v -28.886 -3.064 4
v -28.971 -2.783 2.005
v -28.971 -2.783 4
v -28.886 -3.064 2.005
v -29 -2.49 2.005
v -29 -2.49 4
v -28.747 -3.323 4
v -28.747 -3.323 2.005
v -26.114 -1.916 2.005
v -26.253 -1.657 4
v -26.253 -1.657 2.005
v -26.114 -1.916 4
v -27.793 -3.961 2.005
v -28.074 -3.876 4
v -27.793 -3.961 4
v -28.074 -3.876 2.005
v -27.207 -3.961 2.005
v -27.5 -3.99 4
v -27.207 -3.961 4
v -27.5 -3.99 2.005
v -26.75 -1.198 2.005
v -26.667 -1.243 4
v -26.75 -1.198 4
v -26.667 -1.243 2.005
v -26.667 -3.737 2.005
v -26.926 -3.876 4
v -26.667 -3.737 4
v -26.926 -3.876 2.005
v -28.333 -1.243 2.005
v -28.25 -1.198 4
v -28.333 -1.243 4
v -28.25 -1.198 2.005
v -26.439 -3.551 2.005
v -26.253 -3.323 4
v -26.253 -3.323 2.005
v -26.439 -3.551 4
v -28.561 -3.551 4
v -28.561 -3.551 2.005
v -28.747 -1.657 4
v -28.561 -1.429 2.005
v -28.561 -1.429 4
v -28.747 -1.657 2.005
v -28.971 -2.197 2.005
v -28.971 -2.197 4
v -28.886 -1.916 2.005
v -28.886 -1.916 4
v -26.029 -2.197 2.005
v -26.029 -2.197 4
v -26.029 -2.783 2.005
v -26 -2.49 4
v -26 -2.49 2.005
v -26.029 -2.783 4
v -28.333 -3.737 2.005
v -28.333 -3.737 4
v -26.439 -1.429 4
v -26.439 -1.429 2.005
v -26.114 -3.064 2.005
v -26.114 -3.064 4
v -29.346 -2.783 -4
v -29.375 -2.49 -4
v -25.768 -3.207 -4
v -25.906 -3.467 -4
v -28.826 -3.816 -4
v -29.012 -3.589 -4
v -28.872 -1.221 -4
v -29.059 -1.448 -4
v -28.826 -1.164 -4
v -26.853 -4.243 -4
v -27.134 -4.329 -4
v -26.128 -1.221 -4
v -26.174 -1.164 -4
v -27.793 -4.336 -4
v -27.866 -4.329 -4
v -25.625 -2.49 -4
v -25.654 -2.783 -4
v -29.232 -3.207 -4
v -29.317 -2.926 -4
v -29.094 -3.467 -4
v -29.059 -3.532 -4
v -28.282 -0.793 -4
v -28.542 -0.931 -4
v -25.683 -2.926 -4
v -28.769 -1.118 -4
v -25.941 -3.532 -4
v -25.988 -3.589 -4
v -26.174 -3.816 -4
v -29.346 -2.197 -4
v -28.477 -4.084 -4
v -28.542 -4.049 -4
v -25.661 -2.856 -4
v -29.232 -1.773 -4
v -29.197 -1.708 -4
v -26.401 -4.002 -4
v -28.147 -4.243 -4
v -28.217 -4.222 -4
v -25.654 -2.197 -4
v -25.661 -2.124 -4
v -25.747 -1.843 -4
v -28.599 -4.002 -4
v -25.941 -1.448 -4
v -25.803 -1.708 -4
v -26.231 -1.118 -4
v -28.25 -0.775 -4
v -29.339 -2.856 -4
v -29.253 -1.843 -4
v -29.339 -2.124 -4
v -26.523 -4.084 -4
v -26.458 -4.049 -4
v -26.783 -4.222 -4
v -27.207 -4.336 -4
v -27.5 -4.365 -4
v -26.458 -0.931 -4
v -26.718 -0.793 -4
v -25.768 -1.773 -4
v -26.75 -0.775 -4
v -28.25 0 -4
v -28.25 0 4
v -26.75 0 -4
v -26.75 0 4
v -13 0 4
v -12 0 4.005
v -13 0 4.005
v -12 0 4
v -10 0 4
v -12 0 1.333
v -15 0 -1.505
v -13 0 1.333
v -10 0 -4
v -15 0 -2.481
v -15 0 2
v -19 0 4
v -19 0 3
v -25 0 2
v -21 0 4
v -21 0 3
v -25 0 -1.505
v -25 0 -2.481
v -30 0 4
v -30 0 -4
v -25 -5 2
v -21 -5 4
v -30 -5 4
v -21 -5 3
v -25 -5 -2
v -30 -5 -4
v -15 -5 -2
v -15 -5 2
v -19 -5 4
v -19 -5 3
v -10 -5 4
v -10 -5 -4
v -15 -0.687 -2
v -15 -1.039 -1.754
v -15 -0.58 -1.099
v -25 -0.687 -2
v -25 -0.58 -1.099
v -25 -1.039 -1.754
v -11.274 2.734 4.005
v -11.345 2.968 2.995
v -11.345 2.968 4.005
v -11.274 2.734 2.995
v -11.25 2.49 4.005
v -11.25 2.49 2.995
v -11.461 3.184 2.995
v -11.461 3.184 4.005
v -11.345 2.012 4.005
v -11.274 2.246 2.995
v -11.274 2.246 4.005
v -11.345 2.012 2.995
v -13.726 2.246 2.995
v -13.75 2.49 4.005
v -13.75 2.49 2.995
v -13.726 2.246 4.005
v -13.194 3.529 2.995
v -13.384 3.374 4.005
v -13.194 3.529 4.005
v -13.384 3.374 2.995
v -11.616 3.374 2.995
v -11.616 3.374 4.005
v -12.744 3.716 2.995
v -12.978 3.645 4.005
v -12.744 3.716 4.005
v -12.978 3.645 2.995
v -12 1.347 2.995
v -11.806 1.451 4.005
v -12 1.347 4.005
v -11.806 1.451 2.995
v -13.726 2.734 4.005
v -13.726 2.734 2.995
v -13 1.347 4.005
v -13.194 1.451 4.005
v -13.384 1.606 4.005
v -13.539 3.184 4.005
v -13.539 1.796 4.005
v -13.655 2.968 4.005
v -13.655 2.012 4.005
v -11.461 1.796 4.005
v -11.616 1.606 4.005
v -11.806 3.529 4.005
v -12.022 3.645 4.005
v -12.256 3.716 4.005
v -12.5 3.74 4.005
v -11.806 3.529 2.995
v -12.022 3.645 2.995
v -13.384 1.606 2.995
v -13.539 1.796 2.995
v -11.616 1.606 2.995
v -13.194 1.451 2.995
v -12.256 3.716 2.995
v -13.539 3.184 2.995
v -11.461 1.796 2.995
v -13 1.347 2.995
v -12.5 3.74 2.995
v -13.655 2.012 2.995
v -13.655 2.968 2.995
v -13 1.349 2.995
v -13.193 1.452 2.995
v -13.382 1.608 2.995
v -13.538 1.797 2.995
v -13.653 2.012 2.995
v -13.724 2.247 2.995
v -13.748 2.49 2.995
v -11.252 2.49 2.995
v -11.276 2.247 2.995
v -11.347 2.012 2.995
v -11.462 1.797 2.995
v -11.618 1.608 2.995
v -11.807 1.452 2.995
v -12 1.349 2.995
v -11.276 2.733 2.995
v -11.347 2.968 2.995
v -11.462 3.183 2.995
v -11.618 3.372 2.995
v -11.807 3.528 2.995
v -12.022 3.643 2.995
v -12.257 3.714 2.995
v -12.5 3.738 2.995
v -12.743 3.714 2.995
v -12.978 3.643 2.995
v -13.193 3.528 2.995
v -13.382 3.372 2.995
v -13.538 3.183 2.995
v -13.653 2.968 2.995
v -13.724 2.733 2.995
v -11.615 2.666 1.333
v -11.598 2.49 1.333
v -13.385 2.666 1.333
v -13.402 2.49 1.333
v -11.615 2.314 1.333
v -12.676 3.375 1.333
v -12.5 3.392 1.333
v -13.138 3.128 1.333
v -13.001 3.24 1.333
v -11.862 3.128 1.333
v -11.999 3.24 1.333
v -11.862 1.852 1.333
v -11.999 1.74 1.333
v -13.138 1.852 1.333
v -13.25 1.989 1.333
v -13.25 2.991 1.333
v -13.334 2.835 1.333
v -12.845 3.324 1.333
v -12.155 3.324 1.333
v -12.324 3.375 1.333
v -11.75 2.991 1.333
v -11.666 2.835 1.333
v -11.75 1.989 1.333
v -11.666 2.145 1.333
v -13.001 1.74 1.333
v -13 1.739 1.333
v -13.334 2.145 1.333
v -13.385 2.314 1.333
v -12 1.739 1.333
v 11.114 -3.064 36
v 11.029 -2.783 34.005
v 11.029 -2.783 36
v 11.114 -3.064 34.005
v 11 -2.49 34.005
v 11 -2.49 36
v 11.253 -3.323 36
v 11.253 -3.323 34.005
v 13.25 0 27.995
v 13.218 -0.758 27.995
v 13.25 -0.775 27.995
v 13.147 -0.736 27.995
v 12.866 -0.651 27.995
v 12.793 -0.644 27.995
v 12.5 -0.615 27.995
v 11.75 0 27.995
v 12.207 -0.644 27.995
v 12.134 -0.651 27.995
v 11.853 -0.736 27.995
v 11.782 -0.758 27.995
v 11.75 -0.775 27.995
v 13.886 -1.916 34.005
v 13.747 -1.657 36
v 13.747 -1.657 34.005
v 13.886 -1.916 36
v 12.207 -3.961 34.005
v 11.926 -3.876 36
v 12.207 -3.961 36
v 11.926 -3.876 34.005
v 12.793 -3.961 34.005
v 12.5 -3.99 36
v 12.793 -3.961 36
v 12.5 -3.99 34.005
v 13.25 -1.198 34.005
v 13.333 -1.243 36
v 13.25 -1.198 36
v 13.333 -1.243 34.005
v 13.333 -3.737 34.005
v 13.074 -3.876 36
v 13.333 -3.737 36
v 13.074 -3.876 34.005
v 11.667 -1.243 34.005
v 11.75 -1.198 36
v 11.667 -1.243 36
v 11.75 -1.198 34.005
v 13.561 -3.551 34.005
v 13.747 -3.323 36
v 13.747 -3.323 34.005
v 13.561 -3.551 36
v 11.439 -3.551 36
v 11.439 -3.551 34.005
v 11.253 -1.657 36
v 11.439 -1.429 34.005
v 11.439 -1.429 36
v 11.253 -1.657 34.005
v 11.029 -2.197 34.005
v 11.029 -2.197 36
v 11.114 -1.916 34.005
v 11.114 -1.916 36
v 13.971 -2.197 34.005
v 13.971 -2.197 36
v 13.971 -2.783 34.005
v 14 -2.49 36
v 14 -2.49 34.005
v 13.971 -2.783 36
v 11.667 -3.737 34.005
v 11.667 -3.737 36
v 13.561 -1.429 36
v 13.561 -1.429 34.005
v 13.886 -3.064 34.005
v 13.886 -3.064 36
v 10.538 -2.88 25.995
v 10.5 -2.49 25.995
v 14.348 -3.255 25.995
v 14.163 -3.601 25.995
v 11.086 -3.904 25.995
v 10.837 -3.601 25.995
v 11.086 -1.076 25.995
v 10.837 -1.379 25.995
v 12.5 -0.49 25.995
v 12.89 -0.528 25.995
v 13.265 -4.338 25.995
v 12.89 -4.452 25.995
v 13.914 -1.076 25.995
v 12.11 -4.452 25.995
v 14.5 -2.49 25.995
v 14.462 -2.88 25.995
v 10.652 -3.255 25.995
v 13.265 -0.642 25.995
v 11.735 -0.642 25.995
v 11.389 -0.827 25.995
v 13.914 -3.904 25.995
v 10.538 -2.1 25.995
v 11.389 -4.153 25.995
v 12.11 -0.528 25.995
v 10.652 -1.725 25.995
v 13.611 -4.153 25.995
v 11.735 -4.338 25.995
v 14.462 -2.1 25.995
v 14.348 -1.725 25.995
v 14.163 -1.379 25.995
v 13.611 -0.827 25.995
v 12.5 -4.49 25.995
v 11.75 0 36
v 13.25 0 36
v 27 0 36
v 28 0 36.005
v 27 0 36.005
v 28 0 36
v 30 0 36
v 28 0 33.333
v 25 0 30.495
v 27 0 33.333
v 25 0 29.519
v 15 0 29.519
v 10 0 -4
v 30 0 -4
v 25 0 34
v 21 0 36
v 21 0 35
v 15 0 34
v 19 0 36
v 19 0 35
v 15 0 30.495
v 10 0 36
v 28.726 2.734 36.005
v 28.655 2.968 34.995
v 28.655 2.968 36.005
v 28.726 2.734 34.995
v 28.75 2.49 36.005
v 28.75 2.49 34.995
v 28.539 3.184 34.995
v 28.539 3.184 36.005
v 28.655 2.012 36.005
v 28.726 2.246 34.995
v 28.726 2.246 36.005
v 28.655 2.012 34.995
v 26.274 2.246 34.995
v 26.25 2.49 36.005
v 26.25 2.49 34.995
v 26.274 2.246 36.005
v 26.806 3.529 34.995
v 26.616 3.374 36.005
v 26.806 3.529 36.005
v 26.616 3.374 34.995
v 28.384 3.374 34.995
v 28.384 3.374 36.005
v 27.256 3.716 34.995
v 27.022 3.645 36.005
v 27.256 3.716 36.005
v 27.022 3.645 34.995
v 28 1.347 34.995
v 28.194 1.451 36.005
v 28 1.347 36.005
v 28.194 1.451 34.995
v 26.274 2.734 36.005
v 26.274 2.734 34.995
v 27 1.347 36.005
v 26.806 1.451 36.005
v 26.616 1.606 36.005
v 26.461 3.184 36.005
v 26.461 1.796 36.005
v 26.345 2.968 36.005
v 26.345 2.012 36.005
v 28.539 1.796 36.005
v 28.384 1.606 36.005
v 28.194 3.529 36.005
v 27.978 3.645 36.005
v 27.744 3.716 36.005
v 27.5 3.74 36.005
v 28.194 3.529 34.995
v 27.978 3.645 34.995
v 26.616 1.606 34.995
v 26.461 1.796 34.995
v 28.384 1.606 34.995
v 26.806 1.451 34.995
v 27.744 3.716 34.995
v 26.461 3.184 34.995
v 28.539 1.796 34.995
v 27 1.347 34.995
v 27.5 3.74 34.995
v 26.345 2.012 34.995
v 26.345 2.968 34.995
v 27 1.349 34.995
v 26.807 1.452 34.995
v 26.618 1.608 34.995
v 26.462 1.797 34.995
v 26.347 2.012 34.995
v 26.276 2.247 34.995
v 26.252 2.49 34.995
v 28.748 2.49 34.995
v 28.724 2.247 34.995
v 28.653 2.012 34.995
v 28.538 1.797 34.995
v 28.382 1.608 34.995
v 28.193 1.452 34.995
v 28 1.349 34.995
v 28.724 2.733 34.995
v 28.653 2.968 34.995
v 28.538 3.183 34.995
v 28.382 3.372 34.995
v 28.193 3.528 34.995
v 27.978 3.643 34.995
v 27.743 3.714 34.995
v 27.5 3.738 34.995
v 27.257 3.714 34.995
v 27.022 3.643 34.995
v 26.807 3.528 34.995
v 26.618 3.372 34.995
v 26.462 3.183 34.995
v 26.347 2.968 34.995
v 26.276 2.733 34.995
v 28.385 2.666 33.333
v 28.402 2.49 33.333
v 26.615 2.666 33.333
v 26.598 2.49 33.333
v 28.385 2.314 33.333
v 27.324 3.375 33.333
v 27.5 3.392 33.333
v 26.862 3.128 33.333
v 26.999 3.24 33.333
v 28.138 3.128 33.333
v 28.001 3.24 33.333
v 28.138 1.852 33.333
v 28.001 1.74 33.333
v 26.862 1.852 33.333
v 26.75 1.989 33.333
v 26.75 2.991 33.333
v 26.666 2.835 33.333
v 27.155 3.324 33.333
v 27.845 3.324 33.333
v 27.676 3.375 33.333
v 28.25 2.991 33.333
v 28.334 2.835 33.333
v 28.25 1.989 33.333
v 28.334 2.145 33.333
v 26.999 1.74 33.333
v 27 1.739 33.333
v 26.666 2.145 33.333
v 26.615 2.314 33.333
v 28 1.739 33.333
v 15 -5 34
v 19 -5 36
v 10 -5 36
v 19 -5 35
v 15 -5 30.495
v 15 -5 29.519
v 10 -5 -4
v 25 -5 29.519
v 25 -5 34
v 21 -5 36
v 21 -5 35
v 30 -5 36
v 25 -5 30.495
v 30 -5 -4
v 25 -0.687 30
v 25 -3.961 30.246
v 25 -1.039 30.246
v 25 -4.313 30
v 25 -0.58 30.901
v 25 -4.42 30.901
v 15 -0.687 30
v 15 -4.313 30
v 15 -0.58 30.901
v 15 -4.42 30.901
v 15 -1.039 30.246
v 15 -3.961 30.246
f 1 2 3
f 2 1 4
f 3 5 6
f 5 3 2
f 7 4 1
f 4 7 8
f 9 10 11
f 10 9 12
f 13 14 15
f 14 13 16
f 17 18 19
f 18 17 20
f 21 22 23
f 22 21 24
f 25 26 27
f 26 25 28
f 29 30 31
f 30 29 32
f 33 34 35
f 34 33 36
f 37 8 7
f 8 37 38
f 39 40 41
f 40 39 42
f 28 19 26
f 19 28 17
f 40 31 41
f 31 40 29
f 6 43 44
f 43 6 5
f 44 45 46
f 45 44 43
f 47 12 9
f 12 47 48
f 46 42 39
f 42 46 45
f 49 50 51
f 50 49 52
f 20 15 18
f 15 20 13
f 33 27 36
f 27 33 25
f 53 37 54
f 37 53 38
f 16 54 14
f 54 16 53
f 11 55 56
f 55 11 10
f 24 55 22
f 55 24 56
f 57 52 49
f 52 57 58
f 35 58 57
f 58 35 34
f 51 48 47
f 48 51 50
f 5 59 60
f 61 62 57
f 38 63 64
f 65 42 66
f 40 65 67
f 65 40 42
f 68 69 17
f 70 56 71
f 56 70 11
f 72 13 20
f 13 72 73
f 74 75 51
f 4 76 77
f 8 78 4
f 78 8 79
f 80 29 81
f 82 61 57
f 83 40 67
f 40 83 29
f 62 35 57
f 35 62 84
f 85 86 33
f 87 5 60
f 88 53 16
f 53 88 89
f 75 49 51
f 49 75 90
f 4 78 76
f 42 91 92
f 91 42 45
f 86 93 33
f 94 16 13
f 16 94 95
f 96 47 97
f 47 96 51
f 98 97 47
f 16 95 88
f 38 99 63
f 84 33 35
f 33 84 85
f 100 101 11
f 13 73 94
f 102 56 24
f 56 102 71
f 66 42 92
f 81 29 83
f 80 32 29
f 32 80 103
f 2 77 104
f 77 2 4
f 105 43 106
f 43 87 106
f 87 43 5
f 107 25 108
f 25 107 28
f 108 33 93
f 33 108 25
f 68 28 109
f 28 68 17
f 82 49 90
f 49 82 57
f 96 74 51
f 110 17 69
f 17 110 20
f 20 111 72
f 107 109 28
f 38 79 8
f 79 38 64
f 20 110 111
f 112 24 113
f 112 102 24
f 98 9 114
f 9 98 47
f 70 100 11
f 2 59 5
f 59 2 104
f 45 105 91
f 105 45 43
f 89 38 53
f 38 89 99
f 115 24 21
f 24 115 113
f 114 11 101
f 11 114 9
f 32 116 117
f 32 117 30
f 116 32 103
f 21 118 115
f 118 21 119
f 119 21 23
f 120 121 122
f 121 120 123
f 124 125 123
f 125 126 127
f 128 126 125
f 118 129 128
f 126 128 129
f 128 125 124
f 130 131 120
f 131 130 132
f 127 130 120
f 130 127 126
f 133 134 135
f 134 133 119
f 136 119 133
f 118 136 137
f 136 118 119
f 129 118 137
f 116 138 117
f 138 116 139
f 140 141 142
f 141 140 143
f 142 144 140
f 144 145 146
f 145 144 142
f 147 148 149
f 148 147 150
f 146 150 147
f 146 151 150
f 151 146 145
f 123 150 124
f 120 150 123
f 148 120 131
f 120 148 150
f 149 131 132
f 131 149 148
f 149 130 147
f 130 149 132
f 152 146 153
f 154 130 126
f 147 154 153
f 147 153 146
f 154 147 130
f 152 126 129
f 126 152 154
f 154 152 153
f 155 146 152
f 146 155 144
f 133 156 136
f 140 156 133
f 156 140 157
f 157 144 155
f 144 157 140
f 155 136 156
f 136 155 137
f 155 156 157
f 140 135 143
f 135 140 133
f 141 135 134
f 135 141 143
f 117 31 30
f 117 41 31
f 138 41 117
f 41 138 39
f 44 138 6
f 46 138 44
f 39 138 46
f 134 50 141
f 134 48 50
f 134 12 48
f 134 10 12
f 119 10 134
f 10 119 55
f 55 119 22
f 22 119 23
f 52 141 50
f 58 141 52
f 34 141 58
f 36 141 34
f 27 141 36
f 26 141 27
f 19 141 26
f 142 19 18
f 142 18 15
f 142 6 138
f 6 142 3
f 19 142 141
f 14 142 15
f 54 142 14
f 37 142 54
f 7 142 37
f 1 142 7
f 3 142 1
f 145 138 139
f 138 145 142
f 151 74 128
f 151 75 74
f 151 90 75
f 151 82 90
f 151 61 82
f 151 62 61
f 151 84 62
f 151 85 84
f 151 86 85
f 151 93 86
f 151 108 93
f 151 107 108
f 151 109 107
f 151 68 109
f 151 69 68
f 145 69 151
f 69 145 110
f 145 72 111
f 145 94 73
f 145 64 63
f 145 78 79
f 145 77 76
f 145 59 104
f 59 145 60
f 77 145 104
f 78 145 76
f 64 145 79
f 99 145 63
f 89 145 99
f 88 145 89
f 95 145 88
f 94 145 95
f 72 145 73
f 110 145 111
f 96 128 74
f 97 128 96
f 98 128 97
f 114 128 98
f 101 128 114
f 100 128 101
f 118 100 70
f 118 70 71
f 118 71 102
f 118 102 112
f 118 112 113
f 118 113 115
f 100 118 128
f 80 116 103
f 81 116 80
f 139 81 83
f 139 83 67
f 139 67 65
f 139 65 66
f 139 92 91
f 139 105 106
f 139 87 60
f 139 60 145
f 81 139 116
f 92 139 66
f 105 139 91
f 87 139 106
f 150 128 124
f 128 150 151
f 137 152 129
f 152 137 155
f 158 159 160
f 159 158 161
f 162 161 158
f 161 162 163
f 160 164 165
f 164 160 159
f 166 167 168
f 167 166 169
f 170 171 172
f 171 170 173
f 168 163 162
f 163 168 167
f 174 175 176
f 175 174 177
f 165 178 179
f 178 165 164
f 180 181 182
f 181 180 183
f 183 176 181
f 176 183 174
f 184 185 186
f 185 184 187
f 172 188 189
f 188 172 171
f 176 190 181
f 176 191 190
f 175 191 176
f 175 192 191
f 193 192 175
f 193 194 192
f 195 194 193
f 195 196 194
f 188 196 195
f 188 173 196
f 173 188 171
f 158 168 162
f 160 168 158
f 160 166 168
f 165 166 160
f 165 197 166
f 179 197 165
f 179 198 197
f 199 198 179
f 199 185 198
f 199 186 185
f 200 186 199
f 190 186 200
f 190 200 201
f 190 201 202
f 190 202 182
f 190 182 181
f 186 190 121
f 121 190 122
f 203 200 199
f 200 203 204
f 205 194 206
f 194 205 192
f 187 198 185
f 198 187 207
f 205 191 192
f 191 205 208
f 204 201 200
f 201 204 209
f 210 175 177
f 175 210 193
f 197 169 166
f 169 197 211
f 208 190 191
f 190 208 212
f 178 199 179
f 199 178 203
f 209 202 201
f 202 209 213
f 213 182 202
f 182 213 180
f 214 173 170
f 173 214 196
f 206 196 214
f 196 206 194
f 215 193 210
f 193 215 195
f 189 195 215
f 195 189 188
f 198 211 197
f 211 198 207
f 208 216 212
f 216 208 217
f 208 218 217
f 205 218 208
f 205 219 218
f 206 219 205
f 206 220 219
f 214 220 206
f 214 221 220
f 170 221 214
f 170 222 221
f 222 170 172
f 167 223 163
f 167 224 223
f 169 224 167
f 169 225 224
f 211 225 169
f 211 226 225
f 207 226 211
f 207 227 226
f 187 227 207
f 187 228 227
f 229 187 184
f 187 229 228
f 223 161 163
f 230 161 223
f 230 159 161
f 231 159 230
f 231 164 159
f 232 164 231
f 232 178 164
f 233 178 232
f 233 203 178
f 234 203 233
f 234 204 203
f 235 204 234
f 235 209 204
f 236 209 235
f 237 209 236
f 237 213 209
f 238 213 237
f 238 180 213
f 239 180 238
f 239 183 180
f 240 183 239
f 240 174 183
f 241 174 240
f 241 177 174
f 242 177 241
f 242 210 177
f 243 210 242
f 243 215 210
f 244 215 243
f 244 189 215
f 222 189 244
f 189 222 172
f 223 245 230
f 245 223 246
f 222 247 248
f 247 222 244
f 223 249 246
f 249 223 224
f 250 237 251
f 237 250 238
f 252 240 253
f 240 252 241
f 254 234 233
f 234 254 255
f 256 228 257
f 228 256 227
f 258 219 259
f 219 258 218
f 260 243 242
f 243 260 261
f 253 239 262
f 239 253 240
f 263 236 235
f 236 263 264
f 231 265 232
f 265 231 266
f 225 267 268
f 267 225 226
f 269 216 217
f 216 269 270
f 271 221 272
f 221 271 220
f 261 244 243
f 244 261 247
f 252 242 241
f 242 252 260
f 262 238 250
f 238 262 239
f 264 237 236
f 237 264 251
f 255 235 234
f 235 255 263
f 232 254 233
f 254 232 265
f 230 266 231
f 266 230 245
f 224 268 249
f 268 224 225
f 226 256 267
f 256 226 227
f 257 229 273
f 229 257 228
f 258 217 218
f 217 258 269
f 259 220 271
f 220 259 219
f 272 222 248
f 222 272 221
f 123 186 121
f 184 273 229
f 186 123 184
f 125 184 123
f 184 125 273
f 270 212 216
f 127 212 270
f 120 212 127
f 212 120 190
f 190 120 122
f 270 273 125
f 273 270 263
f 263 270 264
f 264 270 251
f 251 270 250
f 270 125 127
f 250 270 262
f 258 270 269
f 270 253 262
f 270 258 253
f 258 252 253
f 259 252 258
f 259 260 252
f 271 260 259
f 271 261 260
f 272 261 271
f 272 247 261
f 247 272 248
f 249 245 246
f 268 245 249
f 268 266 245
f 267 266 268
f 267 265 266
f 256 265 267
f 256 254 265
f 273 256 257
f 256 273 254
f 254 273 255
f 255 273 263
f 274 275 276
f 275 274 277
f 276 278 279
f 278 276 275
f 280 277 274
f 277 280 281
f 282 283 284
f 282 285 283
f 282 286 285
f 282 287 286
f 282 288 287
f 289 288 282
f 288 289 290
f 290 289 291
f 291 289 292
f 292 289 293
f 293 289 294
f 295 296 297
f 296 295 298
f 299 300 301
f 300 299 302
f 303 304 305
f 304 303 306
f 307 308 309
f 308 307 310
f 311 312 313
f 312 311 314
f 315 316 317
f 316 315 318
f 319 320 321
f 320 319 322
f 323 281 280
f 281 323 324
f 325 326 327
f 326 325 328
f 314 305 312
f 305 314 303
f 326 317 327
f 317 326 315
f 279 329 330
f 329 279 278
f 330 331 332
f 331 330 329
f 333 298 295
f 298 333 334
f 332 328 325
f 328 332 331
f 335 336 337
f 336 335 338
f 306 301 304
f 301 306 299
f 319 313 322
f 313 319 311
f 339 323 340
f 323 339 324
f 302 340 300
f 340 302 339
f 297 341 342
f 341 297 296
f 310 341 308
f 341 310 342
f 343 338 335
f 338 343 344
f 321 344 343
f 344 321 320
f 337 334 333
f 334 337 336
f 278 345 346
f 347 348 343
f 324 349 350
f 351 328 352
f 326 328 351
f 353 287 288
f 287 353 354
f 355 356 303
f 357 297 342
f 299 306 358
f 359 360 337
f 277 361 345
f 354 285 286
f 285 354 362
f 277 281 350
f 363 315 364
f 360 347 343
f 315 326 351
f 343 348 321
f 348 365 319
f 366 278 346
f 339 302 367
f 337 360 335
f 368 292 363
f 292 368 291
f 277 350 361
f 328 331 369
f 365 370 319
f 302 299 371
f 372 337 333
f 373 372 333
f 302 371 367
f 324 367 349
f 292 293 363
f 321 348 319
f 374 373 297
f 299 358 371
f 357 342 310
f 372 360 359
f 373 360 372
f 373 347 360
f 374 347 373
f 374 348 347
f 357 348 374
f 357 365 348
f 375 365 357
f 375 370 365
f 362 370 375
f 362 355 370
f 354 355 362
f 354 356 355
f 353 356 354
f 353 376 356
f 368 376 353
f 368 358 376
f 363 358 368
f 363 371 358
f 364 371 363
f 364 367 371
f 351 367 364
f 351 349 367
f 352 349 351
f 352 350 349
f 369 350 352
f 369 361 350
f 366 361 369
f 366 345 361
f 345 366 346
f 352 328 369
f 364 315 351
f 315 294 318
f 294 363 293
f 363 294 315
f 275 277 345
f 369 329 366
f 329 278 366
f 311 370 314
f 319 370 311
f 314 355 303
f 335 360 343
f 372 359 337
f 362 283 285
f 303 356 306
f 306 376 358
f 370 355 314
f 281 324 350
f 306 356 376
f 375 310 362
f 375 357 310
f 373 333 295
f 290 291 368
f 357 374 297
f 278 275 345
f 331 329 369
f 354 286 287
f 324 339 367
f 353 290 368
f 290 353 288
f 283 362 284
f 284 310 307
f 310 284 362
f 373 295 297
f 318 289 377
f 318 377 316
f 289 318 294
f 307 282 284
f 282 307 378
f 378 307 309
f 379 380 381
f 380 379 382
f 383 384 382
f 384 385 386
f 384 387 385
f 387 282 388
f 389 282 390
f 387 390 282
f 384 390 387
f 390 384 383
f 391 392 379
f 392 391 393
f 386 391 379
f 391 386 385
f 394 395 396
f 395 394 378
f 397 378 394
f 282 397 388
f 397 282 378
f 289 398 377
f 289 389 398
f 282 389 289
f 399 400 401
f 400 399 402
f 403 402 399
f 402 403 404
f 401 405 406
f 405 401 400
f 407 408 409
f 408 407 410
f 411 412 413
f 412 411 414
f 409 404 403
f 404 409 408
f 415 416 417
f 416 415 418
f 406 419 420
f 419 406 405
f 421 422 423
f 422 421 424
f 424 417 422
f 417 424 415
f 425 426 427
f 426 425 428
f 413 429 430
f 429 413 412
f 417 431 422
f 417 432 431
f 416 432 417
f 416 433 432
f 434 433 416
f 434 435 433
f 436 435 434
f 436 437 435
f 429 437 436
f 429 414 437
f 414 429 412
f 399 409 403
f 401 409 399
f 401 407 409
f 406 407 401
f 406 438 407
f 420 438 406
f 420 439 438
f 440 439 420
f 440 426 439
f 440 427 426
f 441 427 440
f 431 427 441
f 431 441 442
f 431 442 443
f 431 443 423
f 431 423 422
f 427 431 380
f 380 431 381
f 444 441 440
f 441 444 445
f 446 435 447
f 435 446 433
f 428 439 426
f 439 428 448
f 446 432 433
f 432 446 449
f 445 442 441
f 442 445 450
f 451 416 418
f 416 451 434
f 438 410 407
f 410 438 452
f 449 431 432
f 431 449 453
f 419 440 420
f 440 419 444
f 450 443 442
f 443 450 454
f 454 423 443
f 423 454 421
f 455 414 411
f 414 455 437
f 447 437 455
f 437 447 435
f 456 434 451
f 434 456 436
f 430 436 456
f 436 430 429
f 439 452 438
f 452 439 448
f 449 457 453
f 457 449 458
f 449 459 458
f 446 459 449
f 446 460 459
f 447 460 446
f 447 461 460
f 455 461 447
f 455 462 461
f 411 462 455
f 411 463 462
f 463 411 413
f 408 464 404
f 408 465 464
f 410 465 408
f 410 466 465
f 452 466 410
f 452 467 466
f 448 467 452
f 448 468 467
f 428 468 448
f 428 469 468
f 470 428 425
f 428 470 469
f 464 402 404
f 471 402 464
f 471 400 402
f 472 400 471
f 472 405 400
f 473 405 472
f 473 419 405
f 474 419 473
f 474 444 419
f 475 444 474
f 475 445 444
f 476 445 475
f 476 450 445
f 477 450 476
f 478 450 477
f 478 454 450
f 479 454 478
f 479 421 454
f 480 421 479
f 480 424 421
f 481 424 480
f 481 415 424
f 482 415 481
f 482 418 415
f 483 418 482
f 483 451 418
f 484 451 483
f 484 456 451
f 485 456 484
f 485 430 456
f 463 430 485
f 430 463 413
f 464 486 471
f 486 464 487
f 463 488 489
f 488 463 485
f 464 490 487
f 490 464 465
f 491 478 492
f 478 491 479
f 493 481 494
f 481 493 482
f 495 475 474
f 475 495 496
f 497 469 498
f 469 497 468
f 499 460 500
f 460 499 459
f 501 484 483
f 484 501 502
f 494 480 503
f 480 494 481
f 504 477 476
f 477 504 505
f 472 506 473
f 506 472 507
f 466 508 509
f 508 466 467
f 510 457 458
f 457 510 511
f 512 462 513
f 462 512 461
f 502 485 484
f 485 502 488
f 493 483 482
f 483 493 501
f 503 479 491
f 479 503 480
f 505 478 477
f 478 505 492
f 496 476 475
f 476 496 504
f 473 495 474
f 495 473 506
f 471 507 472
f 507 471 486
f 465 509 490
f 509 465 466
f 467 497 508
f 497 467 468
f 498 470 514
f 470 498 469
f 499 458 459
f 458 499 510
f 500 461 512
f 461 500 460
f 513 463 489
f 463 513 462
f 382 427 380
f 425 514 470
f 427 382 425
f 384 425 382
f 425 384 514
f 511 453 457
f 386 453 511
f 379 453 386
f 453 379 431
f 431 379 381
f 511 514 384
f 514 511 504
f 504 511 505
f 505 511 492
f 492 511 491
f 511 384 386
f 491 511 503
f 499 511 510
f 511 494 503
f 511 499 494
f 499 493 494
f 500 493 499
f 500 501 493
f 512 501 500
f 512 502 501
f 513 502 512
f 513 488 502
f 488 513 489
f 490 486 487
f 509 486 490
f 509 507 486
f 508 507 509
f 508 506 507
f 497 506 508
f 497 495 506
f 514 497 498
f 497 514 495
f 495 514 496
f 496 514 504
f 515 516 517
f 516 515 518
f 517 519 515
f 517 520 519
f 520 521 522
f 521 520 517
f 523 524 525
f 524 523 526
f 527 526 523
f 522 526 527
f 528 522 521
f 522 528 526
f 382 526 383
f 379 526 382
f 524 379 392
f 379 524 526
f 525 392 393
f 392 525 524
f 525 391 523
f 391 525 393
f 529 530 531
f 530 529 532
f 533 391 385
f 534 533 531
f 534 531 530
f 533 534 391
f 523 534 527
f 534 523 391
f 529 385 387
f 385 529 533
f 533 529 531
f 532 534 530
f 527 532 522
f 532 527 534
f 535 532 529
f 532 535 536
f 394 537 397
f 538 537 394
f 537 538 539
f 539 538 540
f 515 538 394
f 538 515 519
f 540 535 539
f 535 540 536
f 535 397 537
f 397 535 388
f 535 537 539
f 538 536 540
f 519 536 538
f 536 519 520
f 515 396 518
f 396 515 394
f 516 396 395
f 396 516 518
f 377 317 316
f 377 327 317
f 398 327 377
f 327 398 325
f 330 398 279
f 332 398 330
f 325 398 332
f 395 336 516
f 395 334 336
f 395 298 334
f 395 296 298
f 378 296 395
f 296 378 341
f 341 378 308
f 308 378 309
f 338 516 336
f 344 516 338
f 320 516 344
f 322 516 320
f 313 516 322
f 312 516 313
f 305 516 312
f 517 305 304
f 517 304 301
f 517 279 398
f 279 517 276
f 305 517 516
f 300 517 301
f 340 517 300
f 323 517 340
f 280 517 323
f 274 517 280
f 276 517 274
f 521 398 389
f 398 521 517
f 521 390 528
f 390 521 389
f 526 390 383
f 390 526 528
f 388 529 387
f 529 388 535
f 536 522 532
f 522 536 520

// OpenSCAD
include <train_tube_track.scad>;



ttt_curved180_ramp_2();
